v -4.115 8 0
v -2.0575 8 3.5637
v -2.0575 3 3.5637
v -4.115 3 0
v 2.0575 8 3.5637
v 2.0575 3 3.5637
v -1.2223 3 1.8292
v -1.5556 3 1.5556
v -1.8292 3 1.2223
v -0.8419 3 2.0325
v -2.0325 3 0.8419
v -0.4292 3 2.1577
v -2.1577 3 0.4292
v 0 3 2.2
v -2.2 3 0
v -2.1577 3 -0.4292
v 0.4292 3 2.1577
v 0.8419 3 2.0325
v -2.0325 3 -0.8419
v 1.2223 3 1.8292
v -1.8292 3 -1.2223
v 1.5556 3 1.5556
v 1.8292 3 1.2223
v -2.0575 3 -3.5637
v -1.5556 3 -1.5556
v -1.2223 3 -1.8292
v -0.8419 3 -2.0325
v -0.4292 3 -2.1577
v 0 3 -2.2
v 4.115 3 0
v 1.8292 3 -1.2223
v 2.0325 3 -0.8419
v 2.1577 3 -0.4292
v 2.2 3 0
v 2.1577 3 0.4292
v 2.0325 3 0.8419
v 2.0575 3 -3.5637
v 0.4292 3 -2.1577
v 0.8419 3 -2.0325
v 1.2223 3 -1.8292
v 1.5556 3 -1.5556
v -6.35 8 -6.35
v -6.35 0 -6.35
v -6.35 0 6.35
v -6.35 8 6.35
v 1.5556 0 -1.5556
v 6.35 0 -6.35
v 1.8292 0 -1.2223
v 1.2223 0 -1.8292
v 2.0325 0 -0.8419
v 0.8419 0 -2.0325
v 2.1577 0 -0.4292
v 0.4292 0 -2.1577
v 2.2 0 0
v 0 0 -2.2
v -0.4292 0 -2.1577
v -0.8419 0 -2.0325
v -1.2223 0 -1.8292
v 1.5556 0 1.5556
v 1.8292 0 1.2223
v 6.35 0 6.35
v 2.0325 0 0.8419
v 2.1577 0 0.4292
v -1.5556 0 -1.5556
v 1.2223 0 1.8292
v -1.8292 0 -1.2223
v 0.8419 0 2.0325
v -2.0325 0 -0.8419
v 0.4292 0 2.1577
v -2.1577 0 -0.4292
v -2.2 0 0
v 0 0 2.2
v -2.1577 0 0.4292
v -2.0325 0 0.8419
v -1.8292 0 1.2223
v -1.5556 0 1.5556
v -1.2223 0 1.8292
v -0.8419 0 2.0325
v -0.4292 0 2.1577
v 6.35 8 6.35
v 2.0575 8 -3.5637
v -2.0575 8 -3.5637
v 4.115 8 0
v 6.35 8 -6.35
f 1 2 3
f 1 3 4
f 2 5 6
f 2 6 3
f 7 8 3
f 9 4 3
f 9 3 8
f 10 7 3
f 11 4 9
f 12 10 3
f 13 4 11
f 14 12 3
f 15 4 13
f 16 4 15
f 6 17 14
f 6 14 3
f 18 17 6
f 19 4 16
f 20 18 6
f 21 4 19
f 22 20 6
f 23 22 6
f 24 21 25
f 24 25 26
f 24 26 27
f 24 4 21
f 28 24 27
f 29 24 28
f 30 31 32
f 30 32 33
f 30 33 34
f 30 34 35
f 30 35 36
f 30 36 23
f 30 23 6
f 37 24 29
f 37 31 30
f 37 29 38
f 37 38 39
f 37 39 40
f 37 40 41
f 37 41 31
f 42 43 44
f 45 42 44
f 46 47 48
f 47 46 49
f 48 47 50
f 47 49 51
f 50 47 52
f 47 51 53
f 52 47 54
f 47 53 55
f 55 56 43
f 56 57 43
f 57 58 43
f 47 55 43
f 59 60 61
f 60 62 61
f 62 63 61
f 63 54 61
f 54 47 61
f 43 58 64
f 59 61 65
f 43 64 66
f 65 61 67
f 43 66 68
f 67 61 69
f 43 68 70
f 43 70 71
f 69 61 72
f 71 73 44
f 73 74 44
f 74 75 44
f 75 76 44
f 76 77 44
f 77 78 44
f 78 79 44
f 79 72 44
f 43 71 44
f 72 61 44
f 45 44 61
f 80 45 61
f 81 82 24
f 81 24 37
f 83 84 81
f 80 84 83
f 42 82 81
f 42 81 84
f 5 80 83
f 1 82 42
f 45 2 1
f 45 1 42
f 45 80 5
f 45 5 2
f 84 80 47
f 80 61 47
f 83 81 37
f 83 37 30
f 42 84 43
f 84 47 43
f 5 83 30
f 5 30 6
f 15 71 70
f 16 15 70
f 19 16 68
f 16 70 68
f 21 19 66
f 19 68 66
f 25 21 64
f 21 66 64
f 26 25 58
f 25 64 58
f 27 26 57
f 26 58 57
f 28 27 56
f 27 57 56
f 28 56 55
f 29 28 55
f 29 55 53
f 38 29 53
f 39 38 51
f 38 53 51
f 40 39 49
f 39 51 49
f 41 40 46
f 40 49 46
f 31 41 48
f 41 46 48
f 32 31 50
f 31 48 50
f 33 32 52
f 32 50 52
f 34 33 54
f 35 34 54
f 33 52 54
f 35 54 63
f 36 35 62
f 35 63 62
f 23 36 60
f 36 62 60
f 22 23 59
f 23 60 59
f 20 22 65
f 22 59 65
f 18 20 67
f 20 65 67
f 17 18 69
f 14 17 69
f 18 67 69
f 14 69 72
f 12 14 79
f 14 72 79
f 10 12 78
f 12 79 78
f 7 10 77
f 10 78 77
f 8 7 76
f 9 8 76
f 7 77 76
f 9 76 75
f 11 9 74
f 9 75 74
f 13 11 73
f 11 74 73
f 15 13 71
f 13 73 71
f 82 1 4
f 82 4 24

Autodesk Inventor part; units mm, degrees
ref_plane "YZ Plane" through (0, 0, 0) normal (1, 0, 0) x (0, 1, 0)
ref_plane "XZ Plane" through (0, 0, 0) normal (0, 1, 0) x (-1, 0, 0)
ref_plane "XY Plane" through (0, 0, 0) normal (0, 0, 1) x (1, 0, 0)
sketch "Sketch1" plane through (0, 0, 0) normal (0, 1, 0) x (-1, 0, 0)
  line L0 (6.35, 6.35) -> (-6.35, 6.35)
  line L1 (-6.35, 6.35) -> (-6.35, -6.35)
  line L2 (-6.35, -6.35) -> (6.35, -6.35)
  line L3 (6.35, -6.35) -> (6.35, 6.35)
  line L4 (6.35, 6.35) -> (-6.35, -6.35) construction
  line L5 (-6.35, 6.35) -> (6.35, -6.35) construction
  circle A0 centre (0, 0) radius 2.2
  dimension "d0" = 12.7
  dimension "d1" = 12.7
  dimension "d2" = 4.4
extrude "Extrusion1" add sketch "Sketch1" along normal blind 8
sketch "Sketch2" plane through (0, 8, 0) normal (0, 1, 0) x (1, 0, 0)
  circle A0 centre (0, 0) radius 4.115 construction
  line L0 (4.115, 0) -> (2.0575, -3.5637)
  line L1 (2.0575, -3.5637) -> (-2.0575, -3.5637)
  line L2 (-2.0575, -3.5637) -> (-4.115, 0)
  line L3 (-4.115, 0) -> (-2.0575, 3.5637)
  line L4 (-2.0575, 3.5637) -> (2.0575, 3.5637)
  line L5 (2.0575, 3.5637) -> (4.115, 0)
  dimension "d5" = 8.23
extrude "Extrusion2" cut sketch "Sketch2" against normal blind 5
properties part number "M4 net well test"
